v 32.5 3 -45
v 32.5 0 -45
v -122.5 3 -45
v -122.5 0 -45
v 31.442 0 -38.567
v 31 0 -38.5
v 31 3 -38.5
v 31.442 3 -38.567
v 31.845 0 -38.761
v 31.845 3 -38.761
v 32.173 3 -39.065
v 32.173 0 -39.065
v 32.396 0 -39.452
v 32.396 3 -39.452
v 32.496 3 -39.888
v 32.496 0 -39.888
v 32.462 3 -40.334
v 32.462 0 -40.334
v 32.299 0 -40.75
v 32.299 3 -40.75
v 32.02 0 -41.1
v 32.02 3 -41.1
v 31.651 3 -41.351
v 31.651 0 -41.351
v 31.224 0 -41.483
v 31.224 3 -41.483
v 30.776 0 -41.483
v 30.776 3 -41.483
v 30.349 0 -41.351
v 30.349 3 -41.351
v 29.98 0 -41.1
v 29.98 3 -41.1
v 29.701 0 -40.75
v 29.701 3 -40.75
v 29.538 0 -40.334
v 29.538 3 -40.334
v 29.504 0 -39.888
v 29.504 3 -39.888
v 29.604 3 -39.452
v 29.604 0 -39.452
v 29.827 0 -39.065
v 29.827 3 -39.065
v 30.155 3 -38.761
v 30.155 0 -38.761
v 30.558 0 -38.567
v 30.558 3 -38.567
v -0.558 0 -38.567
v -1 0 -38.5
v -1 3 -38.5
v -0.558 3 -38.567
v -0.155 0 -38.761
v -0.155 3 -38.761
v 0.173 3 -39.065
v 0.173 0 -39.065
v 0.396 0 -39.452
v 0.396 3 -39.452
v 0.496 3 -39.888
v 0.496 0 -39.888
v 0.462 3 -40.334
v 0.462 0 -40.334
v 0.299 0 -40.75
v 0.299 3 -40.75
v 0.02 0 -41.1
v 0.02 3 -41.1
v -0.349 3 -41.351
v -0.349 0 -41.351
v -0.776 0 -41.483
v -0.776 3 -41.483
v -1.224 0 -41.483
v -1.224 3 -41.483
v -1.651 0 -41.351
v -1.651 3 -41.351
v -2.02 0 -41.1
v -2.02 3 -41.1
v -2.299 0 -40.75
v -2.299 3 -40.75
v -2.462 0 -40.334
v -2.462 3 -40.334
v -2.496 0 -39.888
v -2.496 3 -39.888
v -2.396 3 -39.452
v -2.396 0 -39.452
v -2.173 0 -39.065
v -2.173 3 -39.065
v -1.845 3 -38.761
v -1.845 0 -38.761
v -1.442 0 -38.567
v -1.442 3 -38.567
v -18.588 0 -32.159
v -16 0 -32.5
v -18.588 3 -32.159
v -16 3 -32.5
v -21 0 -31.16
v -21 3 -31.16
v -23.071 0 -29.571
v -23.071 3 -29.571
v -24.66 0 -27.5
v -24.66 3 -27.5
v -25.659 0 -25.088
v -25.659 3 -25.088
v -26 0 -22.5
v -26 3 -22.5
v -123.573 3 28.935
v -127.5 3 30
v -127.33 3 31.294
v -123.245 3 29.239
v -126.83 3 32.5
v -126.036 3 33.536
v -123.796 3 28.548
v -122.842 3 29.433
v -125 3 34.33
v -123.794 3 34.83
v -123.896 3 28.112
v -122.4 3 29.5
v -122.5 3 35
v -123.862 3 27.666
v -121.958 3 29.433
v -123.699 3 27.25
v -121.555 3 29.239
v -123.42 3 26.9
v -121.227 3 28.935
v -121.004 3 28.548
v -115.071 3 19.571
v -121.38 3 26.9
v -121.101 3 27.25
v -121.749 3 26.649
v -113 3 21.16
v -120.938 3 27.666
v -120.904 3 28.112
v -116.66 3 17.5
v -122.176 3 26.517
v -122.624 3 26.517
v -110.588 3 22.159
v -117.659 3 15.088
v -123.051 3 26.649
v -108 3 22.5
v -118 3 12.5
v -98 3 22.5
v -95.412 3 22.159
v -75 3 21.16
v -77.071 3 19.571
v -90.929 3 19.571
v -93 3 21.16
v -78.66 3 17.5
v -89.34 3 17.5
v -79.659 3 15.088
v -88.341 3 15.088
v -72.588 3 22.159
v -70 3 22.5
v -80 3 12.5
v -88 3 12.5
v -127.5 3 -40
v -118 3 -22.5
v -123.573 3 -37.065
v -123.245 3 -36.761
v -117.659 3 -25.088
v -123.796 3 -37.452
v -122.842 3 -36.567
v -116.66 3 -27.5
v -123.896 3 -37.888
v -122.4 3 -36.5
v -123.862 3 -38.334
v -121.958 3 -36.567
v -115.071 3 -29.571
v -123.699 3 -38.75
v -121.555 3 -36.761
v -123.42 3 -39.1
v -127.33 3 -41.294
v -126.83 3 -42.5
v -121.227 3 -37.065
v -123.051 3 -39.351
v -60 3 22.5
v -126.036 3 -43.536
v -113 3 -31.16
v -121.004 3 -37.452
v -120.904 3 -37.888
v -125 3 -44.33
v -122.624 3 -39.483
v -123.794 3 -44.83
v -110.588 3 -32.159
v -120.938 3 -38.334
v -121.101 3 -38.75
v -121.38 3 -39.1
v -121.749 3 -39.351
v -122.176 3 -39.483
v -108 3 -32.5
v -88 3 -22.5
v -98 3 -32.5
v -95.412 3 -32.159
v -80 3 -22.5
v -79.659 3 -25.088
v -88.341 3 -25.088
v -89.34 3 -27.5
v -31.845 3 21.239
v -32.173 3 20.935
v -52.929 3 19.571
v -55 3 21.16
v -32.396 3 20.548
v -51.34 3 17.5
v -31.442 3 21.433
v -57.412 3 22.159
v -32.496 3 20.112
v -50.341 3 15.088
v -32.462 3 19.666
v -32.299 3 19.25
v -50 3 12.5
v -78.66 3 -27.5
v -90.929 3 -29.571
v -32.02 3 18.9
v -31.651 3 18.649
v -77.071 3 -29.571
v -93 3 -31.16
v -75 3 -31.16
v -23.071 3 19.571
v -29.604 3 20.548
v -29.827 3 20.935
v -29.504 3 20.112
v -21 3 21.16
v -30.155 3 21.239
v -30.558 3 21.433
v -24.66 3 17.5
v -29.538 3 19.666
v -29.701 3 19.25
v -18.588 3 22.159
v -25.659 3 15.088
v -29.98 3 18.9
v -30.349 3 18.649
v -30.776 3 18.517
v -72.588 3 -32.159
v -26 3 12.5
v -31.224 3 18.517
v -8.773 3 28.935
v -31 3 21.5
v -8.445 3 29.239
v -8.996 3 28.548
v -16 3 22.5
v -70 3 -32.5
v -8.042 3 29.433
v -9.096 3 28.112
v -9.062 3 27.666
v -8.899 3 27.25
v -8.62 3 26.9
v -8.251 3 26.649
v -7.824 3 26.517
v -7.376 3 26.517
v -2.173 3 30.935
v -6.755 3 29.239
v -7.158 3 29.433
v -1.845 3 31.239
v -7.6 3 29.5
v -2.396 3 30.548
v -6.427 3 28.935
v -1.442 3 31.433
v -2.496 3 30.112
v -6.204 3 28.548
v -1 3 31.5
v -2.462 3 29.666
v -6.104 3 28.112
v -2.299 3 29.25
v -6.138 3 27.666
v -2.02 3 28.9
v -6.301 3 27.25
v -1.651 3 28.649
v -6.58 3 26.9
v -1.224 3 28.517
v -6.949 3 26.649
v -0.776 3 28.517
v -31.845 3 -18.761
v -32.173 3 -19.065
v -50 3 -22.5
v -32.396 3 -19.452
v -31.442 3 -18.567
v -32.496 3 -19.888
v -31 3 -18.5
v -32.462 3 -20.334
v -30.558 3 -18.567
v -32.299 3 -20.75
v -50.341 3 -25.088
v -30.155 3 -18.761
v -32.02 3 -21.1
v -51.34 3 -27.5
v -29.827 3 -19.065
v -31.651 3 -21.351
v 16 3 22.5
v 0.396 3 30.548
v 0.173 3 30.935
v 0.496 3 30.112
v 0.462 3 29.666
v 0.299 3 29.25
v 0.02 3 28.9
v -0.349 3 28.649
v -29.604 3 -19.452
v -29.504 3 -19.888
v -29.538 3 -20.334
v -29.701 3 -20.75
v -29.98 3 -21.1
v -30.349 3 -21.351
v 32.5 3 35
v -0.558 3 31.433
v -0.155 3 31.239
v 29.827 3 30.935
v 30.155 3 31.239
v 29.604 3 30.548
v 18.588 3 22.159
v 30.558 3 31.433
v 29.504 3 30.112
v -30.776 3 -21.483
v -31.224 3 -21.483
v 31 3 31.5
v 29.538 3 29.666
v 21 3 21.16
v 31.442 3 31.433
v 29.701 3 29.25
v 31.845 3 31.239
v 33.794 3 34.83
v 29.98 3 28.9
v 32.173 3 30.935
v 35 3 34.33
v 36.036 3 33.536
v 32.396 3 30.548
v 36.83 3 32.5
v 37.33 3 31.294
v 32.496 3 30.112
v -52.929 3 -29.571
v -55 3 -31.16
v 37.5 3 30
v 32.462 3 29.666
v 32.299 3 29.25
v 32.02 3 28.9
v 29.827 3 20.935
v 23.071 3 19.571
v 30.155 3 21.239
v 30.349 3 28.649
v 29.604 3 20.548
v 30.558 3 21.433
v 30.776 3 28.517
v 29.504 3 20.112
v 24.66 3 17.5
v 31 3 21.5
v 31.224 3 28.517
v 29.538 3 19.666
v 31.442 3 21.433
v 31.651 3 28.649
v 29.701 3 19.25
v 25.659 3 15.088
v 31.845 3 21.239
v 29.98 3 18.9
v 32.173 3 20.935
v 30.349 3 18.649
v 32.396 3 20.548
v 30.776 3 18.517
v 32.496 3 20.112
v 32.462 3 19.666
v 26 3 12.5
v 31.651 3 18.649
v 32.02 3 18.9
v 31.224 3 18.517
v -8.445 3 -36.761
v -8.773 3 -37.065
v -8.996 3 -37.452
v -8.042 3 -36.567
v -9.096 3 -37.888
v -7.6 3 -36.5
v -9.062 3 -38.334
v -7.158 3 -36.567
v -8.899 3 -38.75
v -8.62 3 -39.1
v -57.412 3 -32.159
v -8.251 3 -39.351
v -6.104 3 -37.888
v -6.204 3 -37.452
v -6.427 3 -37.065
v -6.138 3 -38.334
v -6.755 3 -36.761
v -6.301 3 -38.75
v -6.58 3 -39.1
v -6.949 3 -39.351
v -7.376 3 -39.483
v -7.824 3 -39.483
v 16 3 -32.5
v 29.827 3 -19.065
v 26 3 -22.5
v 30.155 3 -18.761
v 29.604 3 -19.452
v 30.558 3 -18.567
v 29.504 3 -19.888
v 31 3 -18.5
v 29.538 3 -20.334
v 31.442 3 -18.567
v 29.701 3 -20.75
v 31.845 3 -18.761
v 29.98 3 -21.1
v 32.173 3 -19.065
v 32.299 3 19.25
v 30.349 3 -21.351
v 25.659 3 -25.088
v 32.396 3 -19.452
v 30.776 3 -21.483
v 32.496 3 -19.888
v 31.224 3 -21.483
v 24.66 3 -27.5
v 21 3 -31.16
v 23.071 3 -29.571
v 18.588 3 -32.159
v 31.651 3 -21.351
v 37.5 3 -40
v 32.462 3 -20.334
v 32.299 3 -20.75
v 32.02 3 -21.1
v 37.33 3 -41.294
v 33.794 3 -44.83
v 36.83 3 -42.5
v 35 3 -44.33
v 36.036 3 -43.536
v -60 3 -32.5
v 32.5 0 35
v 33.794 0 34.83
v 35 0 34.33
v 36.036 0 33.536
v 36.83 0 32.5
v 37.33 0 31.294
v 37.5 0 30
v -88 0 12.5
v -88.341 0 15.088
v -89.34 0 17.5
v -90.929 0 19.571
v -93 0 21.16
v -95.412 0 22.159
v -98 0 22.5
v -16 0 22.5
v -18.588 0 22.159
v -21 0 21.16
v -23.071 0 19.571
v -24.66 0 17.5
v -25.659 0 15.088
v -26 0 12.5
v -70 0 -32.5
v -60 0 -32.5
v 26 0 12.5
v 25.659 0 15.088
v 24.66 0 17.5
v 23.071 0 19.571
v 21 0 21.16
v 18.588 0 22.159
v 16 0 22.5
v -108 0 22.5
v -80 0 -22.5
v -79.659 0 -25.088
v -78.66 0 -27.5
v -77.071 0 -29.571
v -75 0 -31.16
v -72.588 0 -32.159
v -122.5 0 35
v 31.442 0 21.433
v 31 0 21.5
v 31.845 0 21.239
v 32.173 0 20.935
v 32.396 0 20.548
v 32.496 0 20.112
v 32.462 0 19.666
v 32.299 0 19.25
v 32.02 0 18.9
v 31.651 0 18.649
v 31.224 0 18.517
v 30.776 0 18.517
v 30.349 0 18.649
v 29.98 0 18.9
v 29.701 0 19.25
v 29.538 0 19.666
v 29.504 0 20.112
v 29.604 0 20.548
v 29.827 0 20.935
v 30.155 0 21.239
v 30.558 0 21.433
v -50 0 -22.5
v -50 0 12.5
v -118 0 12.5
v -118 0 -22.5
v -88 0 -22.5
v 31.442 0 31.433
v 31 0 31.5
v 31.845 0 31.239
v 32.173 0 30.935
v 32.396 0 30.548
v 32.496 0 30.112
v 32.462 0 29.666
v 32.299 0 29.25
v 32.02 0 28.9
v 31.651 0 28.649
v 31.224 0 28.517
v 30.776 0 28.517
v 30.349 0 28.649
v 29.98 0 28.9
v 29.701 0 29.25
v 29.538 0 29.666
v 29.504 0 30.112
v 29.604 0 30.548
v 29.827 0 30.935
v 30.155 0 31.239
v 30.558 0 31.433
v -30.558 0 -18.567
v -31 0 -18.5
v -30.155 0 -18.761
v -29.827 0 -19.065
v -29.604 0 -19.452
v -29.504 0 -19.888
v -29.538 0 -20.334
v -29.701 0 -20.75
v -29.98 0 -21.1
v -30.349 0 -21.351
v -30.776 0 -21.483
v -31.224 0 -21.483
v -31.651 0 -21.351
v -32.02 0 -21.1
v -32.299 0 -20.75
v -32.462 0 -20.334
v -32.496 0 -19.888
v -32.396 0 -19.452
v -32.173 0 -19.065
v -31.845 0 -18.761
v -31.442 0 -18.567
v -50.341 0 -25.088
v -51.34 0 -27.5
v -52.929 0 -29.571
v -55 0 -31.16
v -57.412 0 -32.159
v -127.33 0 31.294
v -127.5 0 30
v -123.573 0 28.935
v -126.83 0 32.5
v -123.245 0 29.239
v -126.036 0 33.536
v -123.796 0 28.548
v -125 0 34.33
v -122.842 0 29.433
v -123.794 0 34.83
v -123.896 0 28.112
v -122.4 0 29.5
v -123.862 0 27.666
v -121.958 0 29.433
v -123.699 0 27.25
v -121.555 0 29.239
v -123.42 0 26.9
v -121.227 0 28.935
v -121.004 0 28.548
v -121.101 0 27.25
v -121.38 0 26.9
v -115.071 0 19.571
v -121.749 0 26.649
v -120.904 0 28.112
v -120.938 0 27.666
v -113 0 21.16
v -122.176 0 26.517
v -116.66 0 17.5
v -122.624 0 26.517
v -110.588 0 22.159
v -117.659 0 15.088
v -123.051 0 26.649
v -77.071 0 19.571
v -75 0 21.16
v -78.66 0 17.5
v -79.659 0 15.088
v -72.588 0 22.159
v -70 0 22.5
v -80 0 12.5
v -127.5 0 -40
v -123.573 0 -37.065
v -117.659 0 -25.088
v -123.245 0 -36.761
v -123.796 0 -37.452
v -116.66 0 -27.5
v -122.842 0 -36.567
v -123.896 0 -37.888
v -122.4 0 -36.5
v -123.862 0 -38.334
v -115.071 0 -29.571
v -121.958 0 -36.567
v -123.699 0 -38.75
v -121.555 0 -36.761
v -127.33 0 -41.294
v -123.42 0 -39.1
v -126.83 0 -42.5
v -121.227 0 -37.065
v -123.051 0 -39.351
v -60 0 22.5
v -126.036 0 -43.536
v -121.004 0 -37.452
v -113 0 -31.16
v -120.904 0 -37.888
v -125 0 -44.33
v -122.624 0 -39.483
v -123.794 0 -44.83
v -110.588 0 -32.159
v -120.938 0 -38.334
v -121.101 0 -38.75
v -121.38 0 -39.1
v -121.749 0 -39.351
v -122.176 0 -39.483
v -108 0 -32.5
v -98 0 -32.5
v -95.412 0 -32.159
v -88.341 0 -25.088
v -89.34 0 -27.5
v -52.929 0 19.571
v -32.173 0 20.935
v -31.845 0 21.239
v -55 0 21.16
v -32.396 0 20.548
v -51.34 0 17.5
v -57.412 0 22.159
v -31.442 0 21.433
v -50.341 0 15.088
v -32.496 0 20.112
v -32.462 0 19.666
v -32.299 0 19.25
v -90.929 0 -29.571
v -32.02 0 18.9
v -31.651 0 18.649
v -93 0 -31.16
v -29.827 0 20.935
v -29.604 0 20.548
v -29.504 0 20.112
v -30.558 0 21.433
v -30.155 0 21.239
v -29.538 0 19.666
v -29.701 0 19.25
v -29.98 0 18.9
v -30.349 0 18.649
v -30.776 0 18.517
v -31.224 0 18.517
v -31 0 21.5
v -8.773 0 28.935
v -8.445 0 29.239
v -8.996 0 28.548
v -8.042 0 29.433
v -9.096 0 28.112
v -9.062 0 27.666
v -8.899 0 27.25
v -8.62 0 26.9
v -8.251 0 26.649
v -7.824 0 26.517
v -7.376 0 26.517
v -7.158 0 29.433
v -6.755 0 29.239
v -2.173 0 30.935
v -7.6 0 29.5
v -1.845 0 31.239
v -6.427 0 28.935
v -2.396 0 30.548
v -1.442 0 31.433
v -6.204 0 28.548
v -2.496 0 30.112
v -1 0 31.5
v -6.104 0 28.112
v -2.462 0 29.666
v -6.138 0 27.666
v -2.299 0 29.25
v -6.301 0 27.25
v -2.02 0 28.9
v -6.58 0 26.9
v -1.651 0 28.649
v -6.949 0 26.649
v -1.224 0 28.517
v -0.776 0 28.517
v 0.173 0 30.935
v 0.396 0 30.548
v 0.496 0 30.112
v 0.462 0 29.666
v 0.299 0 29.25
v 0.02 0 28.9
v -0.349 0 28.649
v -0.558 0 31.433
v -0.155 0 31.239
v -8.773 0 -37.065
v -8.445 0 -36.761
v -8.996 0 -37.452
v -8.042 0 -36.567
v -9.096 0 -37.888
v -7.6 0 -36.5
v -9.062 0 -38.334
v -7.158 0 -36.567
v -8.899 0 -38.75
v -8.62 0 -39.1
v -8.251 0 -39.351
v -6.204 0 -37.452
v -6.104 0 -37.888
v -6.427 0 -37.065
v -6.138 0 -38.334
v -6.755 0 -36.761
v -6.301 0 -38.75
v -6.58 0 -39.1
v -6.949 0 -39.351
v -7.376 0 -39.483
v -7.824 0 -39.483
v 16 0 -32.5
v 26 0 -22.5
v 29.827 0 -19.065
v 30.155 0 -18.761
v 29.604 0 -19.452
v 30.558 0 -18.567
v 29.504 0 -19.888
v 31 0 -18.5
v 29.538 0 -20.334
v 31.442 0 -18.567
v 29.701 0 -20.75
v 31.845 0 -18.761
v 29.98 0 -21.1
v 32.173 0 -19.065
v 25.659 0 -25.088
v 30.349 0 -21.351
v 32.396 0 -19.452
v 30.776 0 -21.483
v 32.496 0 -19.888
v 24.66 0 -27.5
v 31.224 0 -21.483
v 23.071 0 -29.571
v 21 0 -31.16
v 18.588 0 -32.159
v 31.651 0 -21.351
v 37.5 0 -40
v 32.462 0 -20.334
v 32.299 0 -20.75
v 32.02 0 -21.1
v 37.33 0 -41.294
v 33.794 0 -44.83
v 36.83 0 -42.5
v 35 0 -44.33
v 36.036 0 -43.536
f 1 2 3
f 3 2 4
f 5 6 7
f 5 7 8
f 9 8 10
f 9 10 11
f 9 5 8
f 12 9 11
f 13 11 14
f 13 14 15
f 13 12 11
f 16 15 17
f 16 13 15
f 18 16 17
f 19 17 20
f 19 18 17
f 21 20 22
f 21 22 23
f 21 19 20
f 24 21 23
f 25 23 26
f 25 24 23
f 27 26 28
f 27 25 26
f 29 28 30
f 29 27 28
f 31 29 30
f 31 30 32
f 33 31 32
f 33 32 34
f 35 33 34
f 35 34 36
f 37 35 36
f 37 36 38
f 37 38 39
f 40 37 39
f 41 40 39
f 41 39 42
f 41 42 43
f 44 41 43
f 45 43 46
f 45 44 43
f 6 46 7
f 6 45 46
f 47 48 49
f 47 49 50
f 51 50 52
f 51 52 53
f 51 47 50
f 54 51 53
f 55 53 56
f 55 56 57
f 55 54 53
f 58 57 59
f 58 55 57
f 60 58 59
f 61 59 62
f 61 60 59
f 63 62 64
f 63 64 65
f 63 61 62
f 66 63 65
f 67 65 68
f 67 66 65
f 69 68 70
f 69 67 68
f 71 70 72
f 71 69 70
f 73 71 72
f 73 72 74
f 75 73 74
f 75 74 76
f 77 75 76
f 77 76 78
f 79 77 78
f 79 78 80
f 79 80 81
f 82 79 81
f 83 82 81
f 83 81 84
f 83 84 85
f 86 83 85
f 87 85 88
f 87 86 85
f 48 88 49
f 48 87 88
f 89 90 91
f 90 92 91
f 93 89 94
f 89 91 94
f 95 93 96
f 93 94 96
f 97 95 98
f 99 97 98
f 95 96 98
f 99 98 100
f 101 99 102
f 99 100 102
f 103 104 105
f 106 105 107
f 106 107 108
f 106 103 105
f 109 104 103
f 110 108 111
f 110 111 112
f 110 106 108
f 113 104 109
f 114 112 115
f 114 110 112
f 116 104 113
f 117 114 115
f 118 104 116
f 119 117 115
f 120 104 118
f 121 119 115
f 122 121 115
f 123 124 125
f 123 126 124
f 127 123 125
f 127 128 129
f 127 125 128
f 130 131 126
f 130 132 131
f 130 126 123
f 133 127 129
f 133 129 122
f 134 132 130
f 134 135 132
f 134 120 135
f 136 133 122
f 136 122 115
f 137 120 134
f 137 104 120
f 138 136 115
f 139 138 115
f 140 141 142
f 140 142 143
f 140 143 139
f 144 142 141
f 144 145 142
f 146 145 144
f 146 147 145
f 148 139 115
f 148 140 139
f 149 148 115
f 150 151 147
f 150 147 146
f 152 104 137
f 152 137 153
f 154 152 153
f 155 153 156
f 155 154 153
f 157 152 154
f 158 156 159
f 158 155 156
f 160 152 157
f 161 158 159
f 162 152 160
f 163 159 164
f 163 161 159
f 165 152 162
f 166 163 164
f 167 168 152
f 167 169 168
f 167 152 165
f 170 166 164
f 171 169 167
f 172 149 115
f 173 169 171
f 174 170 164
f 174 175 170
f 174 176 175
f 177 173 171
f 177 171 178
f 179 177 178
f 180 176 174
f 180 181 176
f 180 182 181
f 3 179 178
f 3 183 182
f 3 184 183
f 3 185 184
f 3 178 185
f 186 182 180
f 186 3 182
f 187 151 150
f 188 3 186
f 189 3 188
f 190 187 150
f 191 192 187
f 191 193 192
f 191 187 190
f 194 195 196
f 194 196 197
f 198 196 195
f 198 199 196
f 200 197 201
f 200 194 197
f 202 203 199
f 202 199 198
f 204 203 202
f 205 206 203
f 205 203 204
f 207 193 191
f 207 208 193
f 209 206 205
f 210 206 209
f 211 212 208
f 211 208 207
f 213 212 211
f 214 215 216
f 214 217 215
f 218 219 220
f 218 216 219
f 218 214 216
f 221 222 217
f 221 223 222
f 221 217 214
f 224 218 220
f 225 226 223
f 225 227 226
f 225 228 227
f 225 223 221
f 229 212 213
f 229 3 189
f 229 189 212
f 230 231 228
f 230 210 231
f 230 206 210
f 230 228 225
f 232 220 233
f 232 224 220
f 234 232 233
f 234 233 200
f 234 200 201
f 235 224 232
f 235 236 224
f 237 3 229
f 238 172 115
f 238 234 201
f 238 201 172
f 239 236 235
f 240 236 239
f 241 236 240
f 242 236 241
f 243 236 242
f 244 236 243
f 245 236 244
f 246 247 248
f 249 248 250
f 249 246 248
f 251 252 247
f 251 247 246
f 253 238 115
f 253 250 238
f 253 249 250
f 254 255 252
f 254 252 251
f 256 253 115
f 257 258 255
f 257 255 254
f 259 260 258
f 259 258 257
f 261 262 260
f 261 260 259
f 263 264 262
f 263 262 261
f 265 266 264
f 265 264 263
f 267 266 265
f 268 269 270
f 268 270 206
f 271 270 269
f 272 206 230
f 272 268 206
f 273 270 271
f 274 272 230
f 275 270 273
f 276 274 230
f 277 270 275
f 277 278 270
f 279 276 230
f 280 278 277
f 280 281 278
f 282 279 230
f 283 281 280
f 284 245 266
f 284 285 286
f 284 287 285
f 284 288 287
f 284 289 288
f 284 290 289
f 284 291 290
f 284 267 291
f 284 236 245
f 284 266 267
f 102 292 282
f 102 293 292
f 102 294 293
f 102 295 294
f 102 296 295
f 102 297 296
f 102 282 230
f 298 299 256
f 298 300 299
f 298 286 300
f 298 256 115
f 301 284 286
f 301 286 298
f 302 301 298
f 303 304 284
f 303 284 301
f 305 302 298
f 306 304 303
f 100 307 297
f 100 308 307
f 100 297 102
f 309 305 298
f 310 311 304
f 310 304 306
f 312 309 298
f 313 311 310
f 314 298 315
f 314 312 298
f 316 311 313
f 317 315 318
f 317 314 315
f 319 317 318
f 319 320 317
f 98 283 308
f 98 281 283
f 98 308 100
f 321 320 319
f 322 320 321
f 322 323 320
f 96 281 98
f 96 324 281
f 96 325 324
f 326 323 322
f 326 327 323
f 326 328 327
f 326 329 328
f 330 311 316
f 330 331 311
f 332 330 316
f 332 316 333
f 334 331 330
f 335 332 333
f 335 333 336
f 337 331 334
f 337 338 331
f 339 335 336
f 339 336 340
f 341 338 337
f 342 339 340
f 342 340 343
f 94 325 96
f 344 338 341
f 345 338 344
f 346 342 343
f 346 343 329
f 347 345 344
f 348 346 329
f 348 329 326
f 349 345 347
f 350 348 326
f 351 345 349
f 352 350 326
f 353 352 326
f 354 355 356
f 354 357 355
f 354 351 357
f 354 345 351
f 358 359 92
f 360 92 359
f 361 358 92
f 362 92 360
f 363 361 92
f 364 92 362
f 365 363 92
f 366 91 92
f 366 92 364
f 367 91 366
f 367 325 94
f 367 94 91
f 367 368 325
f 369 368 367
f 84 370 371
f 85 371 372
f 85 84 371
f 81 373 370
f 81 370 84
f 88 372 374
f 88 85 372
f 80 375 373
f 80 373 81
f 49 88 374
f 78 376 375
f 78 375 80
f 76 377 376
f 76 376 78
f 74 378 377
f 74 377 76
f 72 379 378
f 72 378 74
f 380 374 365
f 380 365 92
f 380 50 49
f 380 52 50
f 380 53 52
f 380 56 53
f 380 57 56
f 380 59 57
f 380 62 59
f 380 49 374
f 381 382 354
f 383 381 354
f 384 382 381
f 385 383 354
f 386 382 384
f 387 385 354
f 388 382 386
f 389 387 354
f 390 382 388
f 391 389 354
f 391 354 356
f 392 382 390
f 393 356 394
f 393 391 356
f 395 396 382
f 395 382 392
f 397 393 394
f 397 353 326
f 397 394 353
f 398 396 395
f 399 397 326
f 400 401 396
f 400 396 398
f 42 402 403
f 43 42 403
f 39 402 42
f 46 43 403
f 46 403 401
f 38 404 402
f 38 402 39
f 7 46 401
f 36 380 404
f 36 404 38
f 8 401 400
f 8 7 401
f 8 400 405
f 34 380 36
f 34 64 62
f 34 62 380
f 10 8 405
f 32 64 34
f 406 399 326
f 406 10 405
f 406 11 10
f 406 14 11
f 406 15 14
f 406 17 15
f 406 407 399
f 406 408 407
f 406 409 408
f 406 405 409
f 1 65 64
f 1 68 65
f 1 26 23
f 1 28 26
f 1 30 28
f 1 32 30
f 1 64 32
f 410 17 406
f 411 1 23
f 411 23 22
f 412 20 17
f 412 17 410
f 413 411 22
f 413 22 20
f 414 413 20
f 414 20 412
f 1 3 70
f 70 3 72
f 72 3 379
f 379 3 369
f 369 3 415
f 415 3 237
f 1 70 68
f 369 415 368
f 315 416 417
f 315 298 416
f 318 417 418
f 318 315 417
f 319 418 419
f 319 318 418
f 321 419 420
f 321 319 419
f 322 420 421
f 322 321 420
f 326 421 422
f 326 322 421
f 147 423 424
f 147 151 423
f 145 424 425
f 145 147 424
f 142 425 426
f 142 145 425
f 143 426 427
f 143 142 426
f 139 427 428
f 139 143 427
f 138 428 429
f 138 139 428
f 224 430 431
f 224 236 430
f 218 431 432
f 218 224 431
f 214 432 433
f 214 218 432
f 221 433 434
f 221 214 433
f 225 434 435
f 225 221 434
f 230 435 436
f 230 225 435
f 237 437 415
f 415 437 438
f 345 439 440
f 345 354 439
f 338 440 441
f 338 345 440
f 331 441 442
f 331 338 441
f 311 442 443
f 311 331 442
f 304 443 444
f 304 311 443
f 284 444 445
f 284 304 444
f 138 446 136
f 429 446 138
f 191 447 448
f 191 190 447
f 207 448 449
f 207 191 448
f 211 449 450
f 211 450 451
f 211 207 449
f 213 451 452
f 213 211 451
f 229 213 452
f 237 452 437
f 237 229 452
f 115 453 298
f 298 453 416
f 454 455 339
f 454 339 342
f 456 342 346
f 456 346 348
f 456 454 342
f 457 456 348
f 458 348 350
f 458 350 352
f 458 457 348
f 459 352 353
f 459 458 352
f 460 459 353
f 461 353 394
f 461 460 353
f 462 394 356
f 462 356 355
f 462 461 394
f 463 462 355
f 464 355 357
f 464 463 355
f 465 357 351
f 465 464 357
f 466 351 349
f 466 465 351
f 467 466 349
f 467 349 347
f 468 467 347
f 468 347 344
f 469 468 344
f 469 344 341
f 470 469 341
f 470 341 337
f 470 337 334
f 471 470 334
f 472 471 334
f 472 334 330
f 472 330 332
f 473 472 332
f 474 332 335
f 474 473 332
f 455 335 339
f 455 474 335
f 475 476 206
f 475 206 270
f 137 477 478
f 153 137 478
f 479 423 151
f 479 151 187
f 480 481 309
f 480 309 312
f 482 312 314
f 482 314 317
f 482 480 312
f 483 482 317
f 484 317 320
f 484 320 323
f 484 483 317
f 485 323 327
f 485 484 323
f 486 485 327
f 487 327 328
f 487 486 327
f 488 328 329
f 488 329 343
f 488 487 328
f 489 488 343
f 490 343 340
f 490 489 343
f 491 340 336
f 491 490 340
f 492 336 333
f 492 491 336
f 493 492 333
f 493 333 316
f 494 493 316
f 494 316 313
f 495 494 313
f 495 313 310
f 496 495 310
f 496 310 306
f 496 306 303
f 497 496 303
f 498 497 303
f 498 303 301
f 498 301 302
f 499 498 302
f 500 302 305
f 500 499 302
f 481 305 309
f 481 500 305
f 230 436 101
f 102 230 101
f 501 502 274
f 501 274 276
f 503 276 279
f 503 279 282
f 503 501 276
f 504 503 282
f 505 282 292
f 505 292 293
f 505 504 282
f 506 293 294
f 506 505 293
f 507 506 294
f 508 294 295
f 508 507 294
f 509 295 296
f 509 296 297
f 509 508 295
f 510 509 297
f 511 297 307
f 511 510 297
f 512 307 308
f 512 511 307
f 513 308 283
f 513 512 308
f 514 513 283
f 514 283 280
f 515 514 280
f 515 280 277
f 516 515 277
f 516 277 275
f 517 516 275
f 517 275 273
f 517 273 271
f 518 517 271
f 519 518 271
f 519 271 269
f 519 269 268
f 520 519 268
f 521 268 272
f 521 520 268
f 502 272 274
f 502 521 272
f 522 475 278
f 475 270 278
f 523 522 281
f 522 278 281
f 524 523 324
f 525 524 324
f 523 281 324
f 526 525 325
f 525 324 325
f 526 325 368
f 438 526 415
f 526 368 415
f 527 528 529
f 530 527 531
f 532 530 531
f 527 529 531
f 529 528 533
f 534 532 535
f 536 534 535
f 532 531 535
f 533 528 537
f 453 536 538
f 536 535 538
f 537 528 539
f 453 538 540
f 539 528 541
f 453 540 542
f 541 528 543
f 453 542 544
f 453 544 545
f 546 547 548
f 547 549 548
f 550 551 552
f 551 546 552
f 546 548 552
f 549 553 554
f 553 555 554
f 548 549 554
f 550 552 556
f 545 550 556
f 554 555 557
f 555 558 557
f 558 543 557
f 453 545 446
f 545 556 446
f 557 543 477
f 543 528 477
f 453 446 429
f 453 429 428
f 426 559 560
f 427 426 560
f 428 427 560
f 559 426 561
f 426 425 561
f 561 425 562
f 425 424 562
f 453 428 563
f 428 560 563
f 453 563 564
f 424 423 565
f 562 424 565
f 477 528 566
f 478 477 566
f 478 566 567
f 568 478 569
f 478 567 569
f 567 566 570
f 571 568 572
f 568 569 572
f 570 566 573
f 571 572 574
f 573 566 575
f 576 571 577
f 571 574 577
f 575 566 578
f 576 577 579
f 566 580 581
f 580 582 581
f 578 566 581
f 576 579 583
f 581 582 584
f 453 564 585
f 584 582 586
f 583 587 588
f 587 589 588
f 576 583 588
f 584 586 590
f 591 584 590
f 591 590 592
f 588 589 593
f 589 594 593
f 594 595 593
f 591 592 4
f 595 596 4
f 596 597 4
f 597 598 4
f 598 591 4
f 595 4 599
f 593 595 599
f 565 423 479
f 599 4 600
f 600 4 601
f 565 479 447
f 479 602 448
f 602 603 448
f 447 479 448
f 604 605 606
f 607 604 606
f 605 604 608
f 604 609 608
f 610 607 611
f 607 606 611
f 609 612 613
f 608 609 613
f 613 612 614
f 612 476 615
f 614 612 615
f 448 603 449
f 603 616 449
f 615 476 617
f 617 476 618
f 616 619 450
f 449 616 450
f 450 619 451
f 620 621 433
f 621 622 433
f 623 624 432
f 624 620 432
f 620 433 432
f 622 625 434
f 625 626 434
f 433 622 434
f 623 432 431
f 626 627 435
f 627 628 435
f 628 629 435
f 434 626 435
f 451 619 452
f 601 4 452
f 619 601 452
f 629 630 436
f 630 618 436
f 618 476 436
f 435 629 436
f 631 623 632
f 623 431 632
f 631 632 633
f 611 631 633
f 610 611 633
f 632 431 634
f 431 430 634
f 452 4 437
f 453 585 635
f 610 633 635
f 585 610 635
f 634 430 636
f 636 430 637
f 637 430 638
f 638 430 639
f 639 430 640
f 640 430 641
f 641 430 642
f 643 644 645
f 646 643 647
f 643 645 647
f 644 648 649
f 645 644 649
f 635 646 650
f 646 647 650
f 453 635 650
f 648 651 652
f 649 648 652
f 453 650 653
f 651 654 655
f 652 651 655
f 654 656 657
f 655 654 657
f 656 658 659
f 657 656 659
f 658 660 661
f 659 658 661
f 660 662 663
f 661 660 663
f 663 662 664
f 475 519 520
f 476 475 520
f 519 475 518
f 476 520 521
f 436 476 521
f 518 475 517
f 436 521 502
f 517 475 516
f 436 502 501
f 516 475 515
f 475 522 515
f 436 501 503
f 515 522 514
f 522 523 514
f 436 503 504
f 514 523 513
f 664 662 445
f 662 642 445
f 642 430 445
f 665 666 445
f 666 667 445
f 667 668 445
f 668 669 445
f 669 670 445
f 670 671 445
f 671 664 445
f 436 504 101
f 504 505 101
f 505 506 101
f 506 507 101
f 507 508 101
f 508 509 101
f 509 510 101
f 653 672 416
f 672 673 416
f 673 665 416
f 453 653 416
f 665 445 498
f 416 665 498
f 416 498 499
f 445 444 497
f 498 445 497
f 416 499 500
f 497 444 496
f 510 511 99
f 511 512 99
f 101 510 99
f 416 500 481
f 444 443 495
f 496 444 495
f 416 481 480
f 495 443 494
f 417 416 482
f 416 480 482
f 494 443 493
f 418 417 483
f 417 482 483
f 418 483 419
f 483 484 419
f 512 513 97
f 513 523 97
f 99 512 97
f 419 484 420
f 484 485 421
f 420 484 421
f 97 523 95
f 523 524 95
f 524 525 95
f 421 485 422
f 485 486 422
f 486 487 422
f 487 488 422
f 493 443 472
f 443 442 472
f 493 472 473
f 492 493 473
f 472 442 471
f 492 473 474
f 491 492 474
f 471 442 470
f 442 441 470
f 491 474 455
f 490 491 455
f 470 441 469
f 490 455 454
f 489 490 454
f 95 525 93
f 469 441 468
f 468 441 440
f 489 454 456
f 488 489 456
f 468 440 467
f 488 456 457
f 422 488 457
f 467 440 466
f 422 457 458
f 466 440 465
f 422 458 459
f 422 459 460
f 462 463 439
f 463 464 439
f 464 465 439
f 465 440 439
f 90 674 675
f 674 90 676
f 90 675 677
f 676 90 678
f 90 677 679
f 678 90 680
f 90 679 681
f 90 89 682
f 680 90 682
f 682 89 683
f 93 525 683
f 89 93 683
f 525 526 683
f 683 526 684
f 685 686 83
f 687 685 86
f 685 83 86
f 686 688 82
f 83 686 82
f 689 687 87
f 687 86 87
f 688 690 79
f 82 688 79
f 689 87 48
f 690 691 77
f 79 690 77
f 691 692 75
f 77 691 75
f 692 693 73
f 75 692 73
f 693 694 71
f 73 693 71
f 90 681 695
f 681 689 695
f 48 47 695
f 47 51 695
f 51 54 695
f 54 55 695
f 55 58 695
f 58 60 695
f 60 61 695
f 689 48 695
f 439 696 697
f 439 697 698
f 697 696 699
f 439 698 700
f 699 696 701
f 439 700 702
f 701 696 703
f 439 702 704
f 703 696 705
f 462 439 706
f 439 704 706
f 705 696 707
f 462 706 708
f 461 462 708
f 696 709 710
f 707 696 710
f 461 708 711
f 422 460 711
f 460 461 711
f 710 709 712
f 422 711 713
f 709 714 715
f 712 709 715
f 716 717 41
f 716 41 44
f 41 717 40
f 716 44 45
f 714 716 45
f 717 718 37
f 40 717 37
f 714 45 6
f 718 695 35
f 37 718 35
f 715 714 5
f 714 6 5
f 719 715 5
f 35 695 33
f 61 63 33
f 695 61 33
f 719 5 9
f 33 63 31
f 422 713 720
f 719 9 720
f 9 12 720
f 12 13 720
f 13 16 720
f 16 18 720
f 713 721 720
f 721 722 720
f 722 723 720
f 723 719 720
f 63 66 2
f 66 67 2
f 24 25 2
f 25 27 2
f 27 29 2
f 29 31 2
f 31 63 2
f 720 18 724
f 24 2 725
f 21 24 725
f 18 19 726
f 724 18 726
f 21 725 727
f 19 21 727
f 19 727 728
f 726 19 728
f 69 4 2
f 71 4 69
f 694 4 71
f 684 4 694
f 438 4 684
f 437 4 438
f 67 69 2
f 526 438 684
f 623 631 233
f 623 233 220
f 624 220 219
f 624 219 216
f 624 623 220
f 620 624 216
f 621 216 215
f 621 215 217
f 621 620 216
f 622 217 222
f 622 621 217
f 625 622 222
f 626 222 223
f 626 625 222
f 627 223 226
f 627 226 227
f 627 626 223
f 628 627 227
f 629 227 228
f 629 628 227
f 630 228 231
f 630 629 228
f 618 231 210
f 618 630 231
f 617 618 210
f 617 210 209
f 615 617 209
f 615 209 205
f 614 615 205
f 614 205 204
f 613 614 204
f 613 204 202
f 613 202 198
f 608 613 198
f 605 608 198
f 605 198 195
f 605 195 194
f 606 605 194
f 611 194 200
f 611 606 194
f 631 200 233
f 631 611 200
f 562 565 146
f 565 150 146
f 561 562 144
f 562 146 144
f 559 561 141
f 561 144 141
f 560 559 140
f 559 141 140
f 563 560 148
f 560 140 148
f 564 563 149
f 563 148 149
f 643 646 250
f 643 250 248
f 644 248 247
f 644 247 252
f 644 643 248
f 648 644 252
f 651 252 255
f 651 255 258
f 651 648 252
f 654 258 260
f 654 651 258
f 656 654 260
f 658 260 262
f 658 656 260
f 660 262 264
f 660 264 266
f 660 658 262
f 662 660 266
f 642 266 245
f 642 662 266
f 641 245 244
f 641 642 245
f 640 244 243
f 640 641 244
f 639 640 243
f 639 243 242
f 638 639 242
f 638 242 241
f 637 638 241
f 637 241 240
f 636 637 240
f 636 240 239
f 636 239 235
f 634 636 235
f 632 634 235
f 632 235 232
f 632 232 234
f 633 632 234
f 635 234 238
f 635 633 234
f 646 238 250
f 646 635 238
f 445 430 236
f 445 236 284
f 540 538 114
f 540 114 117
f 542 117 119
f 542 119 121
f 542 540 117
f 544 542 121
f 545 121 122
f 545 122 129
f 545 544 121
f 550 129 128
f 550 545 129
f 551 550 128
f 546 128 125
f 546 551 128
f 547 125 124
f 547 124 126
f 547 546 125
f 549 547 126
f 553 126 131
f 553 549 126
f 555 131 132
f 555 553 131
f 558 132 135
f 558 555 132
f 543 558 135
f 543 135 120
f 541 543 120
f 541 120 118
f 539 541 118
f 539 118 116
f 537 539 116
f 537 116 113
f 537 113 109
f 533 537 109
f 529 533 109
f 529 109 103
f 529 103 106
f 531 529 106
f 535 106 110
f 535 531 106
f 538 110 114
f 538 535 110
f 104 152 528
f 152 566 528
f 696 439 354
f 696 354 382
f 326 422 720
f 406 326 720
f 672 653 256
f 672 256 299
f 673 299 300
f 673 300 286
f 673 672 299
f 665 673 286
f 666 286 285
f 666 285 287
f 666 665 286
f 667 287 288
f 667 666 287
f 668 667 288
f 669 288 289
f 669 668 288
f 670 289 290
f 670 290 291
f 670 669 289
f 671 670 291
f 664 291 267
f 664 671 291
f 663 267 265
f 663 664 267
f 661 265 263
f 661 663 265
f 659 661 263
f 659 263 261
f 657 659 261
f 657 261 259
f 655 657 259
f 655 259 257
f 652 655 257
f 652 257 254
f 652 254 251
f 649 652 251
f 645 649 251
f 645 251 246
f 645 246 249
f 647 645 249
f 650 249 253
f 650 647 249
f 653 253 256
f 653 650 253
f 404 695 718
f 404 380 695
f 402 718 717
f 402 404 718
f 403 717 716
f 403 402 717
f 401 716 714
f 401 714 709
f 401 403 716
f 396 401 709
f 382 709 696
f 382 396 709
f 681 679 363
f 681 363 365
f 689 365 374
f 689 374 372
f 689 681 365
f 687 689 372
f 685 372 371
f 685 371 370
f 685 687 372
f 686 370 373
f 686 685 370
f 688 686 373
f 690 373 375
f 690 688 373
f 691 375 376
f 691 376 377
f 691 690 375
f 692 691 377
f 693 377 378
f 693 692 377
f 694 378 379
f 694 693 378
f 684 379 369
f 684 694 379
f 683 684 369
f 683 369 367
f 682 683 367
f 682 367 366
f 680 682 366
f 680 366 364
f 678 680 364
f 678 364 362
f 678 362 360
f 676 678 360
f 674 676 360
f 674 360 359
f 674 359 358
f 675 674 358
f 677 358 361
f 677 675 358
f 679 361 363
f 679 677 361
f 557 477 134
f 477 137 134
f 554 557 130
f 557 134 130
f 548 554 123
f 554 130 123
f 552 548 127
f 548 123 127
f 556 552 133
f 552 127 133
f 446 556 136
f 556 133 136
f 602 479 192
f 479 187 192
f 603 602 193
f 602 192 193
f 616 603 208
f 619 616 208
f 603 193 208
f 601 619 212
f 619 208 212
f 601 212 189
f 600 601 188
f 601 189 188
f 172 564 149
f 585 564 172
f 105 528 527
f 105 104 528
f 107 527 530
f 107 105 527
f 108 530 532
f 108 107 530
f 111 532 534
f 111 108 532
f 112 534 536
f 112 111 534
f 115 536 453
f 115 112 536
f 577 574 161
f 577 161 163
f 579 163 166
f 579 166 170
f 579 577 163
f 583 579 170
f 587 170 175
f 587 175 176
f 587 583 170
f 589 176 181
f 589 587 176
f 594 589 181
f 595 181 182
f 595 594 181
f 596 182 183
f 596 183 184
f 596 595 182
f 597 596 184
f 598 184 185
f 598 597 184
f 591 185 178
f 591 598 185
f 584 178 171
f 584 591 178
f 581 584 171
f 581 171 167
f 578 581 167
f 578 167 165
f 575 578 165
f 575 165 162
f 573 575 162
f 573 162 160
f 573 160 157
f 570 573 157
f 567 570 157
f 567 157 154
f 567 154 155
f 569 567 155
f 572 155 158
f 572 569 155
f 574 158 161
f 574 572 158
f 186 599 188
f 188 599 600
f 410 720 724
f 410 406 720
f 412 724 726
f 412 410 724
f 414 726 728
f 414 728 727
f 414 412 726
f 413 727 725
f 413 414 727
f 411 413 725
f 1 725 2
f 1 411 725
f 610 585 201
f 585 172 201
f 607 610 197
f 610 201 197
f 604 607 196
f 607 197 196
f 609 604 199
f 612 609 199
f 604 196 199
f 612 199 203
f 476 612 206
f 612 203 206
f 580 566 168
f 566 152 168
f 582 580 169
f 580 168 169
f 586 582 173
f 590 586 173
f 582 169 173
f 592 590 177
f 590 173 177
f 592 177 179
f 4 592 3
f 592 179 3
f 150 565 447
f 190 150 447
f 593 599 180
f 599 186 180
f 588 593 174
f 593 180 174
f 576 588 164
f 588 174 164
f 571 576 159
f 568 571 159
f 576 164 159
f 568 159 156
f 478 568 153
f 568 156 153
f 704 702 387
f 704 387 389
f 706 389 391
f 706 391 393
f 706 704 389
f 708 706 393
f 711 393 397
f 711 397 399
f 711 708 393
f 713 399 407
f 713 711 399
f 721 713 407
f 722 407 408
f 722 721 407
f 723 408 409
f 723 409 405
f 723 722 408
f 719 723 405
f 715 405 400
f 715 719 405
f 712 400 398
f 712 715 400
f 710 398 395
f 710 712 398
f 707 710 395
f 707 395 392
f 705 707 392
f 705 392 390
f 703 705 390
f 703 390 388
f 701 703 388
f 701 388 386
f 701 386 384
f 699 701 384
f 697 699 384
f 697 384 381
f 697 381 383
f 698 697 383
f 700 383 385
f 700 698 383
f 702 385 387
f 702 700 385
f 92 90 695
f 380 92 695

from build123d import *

# Parameters (mm, degrees)
SKETCH_1_W      = 75
SKETCH_1_H      = 70
SKETCH_1_R      = 1.5
SKETCH_1_W_2    = 52
SKETCH_1_H_2    = 55
SKETCH_1_W_3    = 90
SKETCH_1_W_4    = 30
EXTRUDE_1_DEPTH = 3
FILLET_1_R      = 10
FILLET_2_R      = 5
FILLET_3_R      = 10


with BuildPart() as part:
    # 草图1 → 凸台-拉伸1 (new body)
    # profile 1 of 3: a face of its own
    with BuildSketch(Plane(origin=(0, 0, 0), x_dir=(1, 0, 0), z_dir=(0, 1, 0))):
        Rectangle(SKETCH_1_W, SKETCH_1_H)
        with Locations(Location((-7.6, -28, 0), (0, 0, 270))):
            Circle(SKETCH_1_R, mode=Mode.SUBTRACT)
        with Locations(Location((-31, -20, 0), (0, 0, 270))):
            Circle(SKETCH_1_R, mode=Mode.SUBTRACT)
        with Locations(Location((-1, -30, 0), (0, 0, 270))):
            Circle(SKETCH_1_R, mode=Mode.SUBTRACT)
        with Locations(Location((31, -30, 0), (0, 0, 270))):
            Circle(SKETCH_1_R, mode=Mode.SUBTRACT)
        with Locations(Location((31, -20, 0), (0, 0, 270))):
            Circle(SKETCH_1_R, mode=Mode.SUBTRACT)
        with Locations((0, 5)):
            Rectangle(SKETCH_1_W_2, SKETCH_1_H_2, mode=Mode.SUBTRACT)
        with Locations(Location((-31, 20, 0), (0, 0, 270))):
            Circle(SKETCH_1_R, mode=Mode.SUBTRACT)
        with Locations(Location((31, 20, 0), (0, 0, 270))):
            Circle(SKETCH_1_R, mode=Mode.SUBTRACT)
    # profile 2 of 3: a face of its own
    with BuildSketch(Plane(origin=(0, 0, 0), x_dir=(1, 0, 0), z_dir=(0, 1, 0))):
        with Locations((-82.5, 0)):
            Rectangle(SKETCH_1_W_3, SKETCH_1_H)
        with Locations(Location((-122.4, -28, 0), (0, 0, 270))):
            Circle(SKETCH_1_R, mode=Mode.SUBTRACT)
        with Locations((-65, 5)):
            Rectangle(SKETCH_1_W_4, SKETCH_1_H_2, mode=Mode.SUBTRACT)
        with Locations((-103, 5)):
            Rectangle(SKETCH_1_W_4, SKETCH_1_H_2, mode=Mode.SUBTRACT)
    # profile 3 of 3: a face of its own
    with BuildSketch(Plane(origin=(0, 0, 0), x_dir=(1, 0, 0), z_dir=(0, 1, 0))):
        Polygon((-127.5, 35), (-37.5, 35), (37.5, 35), (37.5, 45), (-127.5, 45), align=None)
        with Locations(Location((-122.4, 38, 0), (0, 0, 270))):
            Circle(SKETCH_1_R, mode=Mode.SUBTRACT)
        with Locations(Location((-7.6, 38, 0), (0, 0, 270))):
            Circle(SKETCH_1_R, mode=Mode.SUBTRACT)
        with Locations(Location((-1, 40, 0), (0, 0, 270))):
            Circle(SKETCH_1_R, mode=Mode.SUBTRACT)
        with Locations(Location((31, 40, 0), (0, 0, 270))):
            Circle(SKETCH_1_R, mode=Mode.SUBTRACT)
    extrude(amount=EXTRUDE_1_DEPTH)

    # 圆角1
    fillet_1_edges = [part.edges().sort_by_distance(p)[0] for p in [
        (-88, 1.5, -32.5),
        (-118, 1.5, -32.5),
        (-118, 1.5, 22.5),
        (-88, 1.5, 22.5),
        (-50, 1.5, -32.5),
        (-80, 1.5, -32.5),
        (-80, 1.5, 22.5),
        (-50, 1.5, 22.5),
    ]]
    fillet(fillet_1_edges, radius=FILLET_1_R)

    # 圆角2
    fillet_2_edges = [part.edges().sort_by_distance(p)[0] for p in [
        (-127.5, 1.5, -45),
        (37.5, 1.5, -45),
        (37.5, 1.5, 35),
        (-127.5, 1.5, 35),
    ]]
    fillet(fillet_2_edges, radius=FILLET_2_R)

    # 圆角3
    fillet_3_edges = [part.edges().sort_by_distance(p)[0] for p in [
        (26, 1.5, -32.5),
        (-26, 1.5, -32.5),
        (-26, 1.5, 22.5),
        (26, 1.5, 22.5),
    ]]
    fillet(fillet_3_edges, radius=FILLET_3_R)


solid = part.part
